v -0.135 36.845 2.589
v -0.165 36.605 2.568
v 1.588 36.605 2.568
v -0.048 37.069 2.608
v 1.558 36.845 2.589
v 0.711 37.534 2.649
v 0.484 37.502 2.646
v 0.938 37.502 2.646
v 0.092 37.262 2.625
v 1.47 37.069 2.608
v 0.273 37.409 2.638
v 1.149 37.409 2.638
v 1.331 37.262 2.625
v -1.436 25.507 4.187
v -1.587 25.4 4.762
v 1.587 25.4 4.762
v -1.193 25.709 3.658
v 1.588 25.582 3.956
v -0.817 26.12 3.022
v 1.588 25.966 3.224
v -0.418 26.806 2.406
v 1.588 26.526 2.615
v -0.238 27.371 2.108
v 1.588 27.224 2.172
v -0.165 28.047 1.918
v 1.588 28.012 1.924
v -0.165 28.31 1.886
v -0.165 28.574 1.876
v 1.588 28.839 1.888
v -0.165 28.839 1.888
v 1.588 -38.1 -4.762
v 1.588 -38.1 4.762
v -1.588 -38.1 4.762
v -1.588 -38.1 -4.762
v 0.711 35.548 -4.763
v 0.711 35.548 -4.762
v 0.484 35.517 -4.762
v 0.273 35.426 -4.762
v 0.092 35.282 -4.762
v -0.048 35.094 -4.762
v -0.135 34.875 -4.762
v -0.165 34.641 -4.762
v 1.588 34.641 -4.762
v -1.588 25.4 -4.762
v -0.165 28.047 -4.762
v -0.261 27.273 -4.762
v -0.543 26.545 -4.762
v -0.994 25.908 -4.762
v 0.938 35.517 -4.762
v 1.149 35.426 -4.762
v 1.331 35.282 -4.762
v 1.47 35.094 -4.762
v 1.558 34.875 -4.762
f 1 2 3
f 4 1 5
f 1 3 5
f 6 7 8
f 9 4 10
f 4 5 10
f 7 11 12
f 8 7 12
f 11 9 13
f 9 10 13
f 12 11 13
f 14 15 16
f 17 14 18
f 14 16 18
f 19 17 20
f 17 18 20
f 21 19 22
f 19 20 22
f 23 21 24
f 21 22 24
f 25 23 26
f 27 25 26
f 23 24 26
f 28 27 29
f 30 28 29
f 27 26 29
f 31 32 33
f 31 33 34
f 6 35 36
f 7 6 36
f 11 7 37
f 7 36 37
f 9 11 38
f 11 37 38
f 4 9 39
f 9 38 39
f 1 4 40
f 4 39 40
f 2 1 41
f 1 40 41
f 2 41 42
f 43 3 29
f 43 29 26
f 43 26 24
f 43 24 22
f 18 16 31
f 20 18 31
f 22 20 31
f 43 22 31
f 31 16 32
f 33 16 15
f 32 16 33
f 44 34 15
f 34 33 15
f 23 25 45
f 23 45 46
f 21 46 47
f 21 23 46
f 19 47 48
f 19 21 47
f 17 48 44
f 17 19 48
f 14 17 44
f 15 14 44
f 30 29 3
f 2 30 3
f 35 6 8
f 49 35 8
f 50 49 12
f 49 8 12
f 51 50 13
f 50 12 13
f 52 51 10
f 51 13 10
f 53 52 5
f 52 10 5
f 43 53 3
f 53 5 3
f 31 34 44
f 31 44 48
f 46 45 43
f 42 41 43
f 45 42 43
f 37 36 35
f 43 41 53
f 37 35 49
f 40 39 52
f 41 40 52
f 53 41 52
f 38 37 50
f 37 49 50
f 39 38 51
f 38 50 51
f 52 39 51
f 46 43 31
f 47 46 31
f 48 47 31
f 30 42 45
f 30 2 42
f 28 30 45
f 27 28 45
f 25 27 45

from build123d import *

# Parameters (mm, degrees)
F4_DEPTH     = 1.5875
F0_W         = 1.4224
F0_H         = 12.7
F5_DEPTH     = 25.4
F1_R         = 0.87629
F2_DEPTH     = 25.4
F7_T1_DEPTH  = 1.7526
F7_T6_DEPTH  = 12.9686376242
F7_T12_DEPTH = 12.9686376242
F7_T17_DEPTH = 10.3818412391


# Not quite as in the source:
# - a fillet or chamfer that OpenCascade refuses, or shapes differently, is made with other operations: its cross-section is extruded or revolved along the edge and cut away or added
# - a fillet or chamfer is up to 0.001 mm smaller than in the source, because OpenCascade refuses the exact size


with BuildPart() as f4:
    # F3 (on Right) → F4 (new body, symmetric)
    with BuildSketch(Plane.YZ):
        Polygon((35.5477839421, -4.7625), (38.1, 4.7625), (-38.1, 4.7625), (-38.1, -4.7625), align=None)
    extrude(amount=F4_DEPTH, both=True)

    # F0 (on face) → F5 (cut)
    with BuildSketch(Plane.XY.offset(4.7625)):
        with Locations((-0.8763, 31.75)):
            Rectangle(F0_W, F0_H)
    extrude(amount=-F5_DEPTH, mode=Mode.SUBTRACT)

    # F1 (radius 0.8763 in the source; OpenCascade refuses exactly that, so slightly less here)
    f1_edges = [f4.edges().sort_by_distance(p)[0] for p in [
        (1.5875, 36.823892, 0),
        (-0.1651, 36.823892, 0),
    ]]
    fillet(f1_edges, radius=F1_R)

    # F6 (on face) → F2 (cut)
    with BuildSketch(Plane.YZ.offset(1.5875)):
        Polygon((37.1927978359, 4.7625), (25.4, 4.7625), (25.4, 1.5875), (36.6047261297, 2.5677865143), align=None)
        Polygon((43.6932000767, 4.7625), (37.1927978359, 4.7625), (36.6047261297, 2.5677865143), (43.6932000767, 3.1879476263), align=None)
    extrude(amount=-F2_DEPTH, mode=Mode.SUBTRACT)

    # F7: fillet of radius 3.175 on 2 edges, made by hand

    # F7_s2 → F7_t1 (join)
    with BuildSketch(Plane.YZ.offset(-0.1651)):
        with BuildLine():
            ThreePointArc((25.4, 4.7625), (26.5256229175, 2.6151836003), (28.8385617484, 1.8883351718))
            Line((28.8385617484, 1.8883351718), (25.4, 1.5875))
            Line((25.4, 1.5875), (25.4, 4.7625))
        make_face()
    extrude(amount=F7_T1_DEPTH)


with BuildPart() as f7_tool4:
    # F7_s5 → F7_t6 (new body)
    with BuildSketch(Plane.XY.offset(8.2061376242)):
        with BuildLine():
            ThreePointArc((-0.1651, 28.0474550497), (-0.5432151257, 26.5447707848), (-1.5875, 25.4))
            Line((-1.5875, 25.4), (-0.1651, 25.4))
            Line((-0.1651, 25.4), (-0.1651, 28.0474550497))
        make_face()
    extrude(amount=-F7_T6_DEPTH)

    split(bisect_by=Plane(origin=(0, 0.0551082957, -0.6298907024), x_dir=(1, 0, 0), z_dir=(0, 0.0871557427, -0.9961946981)), keep=Keep.TOP)


with BuildPart() as f4_1:
    add(f4.part)

    # F7_t3: union F7_tool4
    add(f7_tool4.part)


with BuildPart() as f7_tool10:
    # F7_s11 → F7_t12 (new body)
    with BuildSketch(Plane.XY.offset(8.2061376242)):
        with BuildLine():
            ThreePointArc((-0.1651, 28.0474550497), (-0.5432151257, 26.5447707848), (-1.5875, 25.4))
            Line((-1.5875, 25.4), (-0.1651, 25.4))
            Line((-0.1651, 25.4), (-0.1651, 28.0474550497))
        make_face()
    extrude(amount=-F7_T12_DEPTH)

    split(bisect_by=Plane.XY.offset(4.7625), keep=Keep.BOTTOM)

    split(bisect_by=Plane(origin=(0, 0.0551082957, -0.6298907024), x_dir=(1, 0, 0), z_dir=(0, -0.0871557427, 0.9961946981)), keep=Keep.TOP)


with BuildPart() as f7_tool15:
    # F7_s16 → F7_t17 (new body)
    with BuildSketch(Plane.YZ.offset(1.5875)):
        with BuildLine():
            ThreePointArc((25.4, 4.7625), (26.5256229175, 2.6151836003), (28.8385617484, 1.8883351718))
            Line((28.8385617484, 1.8883351718), (25.4, 1.5875))
            Line((25.4, 1.5875), (25.4, 4.7625))
        make_face()
    extrude(amount=-F7_T17_DEPTH)

    split(bisect_by=Plane.YZ.offset(-0.1651), keep=Keep.BOTTOM)

    split(bisect_by=Plane.YZ.offset(-1.5875), keep=Keep.TOP)


with BuildPart() as f7_tool10_1:
    add(f7_tool10.part)

    # F7_t20: intersect F7_tool15
    add(f7_tool15.part, mode=Mode.INTERSECT)


with BuildPart() as f4_2:
    add(f4_1.part)

    # F7_t8: union F7_tool10
    add(f7_tool10_1.part)


solid = f4_2.part
